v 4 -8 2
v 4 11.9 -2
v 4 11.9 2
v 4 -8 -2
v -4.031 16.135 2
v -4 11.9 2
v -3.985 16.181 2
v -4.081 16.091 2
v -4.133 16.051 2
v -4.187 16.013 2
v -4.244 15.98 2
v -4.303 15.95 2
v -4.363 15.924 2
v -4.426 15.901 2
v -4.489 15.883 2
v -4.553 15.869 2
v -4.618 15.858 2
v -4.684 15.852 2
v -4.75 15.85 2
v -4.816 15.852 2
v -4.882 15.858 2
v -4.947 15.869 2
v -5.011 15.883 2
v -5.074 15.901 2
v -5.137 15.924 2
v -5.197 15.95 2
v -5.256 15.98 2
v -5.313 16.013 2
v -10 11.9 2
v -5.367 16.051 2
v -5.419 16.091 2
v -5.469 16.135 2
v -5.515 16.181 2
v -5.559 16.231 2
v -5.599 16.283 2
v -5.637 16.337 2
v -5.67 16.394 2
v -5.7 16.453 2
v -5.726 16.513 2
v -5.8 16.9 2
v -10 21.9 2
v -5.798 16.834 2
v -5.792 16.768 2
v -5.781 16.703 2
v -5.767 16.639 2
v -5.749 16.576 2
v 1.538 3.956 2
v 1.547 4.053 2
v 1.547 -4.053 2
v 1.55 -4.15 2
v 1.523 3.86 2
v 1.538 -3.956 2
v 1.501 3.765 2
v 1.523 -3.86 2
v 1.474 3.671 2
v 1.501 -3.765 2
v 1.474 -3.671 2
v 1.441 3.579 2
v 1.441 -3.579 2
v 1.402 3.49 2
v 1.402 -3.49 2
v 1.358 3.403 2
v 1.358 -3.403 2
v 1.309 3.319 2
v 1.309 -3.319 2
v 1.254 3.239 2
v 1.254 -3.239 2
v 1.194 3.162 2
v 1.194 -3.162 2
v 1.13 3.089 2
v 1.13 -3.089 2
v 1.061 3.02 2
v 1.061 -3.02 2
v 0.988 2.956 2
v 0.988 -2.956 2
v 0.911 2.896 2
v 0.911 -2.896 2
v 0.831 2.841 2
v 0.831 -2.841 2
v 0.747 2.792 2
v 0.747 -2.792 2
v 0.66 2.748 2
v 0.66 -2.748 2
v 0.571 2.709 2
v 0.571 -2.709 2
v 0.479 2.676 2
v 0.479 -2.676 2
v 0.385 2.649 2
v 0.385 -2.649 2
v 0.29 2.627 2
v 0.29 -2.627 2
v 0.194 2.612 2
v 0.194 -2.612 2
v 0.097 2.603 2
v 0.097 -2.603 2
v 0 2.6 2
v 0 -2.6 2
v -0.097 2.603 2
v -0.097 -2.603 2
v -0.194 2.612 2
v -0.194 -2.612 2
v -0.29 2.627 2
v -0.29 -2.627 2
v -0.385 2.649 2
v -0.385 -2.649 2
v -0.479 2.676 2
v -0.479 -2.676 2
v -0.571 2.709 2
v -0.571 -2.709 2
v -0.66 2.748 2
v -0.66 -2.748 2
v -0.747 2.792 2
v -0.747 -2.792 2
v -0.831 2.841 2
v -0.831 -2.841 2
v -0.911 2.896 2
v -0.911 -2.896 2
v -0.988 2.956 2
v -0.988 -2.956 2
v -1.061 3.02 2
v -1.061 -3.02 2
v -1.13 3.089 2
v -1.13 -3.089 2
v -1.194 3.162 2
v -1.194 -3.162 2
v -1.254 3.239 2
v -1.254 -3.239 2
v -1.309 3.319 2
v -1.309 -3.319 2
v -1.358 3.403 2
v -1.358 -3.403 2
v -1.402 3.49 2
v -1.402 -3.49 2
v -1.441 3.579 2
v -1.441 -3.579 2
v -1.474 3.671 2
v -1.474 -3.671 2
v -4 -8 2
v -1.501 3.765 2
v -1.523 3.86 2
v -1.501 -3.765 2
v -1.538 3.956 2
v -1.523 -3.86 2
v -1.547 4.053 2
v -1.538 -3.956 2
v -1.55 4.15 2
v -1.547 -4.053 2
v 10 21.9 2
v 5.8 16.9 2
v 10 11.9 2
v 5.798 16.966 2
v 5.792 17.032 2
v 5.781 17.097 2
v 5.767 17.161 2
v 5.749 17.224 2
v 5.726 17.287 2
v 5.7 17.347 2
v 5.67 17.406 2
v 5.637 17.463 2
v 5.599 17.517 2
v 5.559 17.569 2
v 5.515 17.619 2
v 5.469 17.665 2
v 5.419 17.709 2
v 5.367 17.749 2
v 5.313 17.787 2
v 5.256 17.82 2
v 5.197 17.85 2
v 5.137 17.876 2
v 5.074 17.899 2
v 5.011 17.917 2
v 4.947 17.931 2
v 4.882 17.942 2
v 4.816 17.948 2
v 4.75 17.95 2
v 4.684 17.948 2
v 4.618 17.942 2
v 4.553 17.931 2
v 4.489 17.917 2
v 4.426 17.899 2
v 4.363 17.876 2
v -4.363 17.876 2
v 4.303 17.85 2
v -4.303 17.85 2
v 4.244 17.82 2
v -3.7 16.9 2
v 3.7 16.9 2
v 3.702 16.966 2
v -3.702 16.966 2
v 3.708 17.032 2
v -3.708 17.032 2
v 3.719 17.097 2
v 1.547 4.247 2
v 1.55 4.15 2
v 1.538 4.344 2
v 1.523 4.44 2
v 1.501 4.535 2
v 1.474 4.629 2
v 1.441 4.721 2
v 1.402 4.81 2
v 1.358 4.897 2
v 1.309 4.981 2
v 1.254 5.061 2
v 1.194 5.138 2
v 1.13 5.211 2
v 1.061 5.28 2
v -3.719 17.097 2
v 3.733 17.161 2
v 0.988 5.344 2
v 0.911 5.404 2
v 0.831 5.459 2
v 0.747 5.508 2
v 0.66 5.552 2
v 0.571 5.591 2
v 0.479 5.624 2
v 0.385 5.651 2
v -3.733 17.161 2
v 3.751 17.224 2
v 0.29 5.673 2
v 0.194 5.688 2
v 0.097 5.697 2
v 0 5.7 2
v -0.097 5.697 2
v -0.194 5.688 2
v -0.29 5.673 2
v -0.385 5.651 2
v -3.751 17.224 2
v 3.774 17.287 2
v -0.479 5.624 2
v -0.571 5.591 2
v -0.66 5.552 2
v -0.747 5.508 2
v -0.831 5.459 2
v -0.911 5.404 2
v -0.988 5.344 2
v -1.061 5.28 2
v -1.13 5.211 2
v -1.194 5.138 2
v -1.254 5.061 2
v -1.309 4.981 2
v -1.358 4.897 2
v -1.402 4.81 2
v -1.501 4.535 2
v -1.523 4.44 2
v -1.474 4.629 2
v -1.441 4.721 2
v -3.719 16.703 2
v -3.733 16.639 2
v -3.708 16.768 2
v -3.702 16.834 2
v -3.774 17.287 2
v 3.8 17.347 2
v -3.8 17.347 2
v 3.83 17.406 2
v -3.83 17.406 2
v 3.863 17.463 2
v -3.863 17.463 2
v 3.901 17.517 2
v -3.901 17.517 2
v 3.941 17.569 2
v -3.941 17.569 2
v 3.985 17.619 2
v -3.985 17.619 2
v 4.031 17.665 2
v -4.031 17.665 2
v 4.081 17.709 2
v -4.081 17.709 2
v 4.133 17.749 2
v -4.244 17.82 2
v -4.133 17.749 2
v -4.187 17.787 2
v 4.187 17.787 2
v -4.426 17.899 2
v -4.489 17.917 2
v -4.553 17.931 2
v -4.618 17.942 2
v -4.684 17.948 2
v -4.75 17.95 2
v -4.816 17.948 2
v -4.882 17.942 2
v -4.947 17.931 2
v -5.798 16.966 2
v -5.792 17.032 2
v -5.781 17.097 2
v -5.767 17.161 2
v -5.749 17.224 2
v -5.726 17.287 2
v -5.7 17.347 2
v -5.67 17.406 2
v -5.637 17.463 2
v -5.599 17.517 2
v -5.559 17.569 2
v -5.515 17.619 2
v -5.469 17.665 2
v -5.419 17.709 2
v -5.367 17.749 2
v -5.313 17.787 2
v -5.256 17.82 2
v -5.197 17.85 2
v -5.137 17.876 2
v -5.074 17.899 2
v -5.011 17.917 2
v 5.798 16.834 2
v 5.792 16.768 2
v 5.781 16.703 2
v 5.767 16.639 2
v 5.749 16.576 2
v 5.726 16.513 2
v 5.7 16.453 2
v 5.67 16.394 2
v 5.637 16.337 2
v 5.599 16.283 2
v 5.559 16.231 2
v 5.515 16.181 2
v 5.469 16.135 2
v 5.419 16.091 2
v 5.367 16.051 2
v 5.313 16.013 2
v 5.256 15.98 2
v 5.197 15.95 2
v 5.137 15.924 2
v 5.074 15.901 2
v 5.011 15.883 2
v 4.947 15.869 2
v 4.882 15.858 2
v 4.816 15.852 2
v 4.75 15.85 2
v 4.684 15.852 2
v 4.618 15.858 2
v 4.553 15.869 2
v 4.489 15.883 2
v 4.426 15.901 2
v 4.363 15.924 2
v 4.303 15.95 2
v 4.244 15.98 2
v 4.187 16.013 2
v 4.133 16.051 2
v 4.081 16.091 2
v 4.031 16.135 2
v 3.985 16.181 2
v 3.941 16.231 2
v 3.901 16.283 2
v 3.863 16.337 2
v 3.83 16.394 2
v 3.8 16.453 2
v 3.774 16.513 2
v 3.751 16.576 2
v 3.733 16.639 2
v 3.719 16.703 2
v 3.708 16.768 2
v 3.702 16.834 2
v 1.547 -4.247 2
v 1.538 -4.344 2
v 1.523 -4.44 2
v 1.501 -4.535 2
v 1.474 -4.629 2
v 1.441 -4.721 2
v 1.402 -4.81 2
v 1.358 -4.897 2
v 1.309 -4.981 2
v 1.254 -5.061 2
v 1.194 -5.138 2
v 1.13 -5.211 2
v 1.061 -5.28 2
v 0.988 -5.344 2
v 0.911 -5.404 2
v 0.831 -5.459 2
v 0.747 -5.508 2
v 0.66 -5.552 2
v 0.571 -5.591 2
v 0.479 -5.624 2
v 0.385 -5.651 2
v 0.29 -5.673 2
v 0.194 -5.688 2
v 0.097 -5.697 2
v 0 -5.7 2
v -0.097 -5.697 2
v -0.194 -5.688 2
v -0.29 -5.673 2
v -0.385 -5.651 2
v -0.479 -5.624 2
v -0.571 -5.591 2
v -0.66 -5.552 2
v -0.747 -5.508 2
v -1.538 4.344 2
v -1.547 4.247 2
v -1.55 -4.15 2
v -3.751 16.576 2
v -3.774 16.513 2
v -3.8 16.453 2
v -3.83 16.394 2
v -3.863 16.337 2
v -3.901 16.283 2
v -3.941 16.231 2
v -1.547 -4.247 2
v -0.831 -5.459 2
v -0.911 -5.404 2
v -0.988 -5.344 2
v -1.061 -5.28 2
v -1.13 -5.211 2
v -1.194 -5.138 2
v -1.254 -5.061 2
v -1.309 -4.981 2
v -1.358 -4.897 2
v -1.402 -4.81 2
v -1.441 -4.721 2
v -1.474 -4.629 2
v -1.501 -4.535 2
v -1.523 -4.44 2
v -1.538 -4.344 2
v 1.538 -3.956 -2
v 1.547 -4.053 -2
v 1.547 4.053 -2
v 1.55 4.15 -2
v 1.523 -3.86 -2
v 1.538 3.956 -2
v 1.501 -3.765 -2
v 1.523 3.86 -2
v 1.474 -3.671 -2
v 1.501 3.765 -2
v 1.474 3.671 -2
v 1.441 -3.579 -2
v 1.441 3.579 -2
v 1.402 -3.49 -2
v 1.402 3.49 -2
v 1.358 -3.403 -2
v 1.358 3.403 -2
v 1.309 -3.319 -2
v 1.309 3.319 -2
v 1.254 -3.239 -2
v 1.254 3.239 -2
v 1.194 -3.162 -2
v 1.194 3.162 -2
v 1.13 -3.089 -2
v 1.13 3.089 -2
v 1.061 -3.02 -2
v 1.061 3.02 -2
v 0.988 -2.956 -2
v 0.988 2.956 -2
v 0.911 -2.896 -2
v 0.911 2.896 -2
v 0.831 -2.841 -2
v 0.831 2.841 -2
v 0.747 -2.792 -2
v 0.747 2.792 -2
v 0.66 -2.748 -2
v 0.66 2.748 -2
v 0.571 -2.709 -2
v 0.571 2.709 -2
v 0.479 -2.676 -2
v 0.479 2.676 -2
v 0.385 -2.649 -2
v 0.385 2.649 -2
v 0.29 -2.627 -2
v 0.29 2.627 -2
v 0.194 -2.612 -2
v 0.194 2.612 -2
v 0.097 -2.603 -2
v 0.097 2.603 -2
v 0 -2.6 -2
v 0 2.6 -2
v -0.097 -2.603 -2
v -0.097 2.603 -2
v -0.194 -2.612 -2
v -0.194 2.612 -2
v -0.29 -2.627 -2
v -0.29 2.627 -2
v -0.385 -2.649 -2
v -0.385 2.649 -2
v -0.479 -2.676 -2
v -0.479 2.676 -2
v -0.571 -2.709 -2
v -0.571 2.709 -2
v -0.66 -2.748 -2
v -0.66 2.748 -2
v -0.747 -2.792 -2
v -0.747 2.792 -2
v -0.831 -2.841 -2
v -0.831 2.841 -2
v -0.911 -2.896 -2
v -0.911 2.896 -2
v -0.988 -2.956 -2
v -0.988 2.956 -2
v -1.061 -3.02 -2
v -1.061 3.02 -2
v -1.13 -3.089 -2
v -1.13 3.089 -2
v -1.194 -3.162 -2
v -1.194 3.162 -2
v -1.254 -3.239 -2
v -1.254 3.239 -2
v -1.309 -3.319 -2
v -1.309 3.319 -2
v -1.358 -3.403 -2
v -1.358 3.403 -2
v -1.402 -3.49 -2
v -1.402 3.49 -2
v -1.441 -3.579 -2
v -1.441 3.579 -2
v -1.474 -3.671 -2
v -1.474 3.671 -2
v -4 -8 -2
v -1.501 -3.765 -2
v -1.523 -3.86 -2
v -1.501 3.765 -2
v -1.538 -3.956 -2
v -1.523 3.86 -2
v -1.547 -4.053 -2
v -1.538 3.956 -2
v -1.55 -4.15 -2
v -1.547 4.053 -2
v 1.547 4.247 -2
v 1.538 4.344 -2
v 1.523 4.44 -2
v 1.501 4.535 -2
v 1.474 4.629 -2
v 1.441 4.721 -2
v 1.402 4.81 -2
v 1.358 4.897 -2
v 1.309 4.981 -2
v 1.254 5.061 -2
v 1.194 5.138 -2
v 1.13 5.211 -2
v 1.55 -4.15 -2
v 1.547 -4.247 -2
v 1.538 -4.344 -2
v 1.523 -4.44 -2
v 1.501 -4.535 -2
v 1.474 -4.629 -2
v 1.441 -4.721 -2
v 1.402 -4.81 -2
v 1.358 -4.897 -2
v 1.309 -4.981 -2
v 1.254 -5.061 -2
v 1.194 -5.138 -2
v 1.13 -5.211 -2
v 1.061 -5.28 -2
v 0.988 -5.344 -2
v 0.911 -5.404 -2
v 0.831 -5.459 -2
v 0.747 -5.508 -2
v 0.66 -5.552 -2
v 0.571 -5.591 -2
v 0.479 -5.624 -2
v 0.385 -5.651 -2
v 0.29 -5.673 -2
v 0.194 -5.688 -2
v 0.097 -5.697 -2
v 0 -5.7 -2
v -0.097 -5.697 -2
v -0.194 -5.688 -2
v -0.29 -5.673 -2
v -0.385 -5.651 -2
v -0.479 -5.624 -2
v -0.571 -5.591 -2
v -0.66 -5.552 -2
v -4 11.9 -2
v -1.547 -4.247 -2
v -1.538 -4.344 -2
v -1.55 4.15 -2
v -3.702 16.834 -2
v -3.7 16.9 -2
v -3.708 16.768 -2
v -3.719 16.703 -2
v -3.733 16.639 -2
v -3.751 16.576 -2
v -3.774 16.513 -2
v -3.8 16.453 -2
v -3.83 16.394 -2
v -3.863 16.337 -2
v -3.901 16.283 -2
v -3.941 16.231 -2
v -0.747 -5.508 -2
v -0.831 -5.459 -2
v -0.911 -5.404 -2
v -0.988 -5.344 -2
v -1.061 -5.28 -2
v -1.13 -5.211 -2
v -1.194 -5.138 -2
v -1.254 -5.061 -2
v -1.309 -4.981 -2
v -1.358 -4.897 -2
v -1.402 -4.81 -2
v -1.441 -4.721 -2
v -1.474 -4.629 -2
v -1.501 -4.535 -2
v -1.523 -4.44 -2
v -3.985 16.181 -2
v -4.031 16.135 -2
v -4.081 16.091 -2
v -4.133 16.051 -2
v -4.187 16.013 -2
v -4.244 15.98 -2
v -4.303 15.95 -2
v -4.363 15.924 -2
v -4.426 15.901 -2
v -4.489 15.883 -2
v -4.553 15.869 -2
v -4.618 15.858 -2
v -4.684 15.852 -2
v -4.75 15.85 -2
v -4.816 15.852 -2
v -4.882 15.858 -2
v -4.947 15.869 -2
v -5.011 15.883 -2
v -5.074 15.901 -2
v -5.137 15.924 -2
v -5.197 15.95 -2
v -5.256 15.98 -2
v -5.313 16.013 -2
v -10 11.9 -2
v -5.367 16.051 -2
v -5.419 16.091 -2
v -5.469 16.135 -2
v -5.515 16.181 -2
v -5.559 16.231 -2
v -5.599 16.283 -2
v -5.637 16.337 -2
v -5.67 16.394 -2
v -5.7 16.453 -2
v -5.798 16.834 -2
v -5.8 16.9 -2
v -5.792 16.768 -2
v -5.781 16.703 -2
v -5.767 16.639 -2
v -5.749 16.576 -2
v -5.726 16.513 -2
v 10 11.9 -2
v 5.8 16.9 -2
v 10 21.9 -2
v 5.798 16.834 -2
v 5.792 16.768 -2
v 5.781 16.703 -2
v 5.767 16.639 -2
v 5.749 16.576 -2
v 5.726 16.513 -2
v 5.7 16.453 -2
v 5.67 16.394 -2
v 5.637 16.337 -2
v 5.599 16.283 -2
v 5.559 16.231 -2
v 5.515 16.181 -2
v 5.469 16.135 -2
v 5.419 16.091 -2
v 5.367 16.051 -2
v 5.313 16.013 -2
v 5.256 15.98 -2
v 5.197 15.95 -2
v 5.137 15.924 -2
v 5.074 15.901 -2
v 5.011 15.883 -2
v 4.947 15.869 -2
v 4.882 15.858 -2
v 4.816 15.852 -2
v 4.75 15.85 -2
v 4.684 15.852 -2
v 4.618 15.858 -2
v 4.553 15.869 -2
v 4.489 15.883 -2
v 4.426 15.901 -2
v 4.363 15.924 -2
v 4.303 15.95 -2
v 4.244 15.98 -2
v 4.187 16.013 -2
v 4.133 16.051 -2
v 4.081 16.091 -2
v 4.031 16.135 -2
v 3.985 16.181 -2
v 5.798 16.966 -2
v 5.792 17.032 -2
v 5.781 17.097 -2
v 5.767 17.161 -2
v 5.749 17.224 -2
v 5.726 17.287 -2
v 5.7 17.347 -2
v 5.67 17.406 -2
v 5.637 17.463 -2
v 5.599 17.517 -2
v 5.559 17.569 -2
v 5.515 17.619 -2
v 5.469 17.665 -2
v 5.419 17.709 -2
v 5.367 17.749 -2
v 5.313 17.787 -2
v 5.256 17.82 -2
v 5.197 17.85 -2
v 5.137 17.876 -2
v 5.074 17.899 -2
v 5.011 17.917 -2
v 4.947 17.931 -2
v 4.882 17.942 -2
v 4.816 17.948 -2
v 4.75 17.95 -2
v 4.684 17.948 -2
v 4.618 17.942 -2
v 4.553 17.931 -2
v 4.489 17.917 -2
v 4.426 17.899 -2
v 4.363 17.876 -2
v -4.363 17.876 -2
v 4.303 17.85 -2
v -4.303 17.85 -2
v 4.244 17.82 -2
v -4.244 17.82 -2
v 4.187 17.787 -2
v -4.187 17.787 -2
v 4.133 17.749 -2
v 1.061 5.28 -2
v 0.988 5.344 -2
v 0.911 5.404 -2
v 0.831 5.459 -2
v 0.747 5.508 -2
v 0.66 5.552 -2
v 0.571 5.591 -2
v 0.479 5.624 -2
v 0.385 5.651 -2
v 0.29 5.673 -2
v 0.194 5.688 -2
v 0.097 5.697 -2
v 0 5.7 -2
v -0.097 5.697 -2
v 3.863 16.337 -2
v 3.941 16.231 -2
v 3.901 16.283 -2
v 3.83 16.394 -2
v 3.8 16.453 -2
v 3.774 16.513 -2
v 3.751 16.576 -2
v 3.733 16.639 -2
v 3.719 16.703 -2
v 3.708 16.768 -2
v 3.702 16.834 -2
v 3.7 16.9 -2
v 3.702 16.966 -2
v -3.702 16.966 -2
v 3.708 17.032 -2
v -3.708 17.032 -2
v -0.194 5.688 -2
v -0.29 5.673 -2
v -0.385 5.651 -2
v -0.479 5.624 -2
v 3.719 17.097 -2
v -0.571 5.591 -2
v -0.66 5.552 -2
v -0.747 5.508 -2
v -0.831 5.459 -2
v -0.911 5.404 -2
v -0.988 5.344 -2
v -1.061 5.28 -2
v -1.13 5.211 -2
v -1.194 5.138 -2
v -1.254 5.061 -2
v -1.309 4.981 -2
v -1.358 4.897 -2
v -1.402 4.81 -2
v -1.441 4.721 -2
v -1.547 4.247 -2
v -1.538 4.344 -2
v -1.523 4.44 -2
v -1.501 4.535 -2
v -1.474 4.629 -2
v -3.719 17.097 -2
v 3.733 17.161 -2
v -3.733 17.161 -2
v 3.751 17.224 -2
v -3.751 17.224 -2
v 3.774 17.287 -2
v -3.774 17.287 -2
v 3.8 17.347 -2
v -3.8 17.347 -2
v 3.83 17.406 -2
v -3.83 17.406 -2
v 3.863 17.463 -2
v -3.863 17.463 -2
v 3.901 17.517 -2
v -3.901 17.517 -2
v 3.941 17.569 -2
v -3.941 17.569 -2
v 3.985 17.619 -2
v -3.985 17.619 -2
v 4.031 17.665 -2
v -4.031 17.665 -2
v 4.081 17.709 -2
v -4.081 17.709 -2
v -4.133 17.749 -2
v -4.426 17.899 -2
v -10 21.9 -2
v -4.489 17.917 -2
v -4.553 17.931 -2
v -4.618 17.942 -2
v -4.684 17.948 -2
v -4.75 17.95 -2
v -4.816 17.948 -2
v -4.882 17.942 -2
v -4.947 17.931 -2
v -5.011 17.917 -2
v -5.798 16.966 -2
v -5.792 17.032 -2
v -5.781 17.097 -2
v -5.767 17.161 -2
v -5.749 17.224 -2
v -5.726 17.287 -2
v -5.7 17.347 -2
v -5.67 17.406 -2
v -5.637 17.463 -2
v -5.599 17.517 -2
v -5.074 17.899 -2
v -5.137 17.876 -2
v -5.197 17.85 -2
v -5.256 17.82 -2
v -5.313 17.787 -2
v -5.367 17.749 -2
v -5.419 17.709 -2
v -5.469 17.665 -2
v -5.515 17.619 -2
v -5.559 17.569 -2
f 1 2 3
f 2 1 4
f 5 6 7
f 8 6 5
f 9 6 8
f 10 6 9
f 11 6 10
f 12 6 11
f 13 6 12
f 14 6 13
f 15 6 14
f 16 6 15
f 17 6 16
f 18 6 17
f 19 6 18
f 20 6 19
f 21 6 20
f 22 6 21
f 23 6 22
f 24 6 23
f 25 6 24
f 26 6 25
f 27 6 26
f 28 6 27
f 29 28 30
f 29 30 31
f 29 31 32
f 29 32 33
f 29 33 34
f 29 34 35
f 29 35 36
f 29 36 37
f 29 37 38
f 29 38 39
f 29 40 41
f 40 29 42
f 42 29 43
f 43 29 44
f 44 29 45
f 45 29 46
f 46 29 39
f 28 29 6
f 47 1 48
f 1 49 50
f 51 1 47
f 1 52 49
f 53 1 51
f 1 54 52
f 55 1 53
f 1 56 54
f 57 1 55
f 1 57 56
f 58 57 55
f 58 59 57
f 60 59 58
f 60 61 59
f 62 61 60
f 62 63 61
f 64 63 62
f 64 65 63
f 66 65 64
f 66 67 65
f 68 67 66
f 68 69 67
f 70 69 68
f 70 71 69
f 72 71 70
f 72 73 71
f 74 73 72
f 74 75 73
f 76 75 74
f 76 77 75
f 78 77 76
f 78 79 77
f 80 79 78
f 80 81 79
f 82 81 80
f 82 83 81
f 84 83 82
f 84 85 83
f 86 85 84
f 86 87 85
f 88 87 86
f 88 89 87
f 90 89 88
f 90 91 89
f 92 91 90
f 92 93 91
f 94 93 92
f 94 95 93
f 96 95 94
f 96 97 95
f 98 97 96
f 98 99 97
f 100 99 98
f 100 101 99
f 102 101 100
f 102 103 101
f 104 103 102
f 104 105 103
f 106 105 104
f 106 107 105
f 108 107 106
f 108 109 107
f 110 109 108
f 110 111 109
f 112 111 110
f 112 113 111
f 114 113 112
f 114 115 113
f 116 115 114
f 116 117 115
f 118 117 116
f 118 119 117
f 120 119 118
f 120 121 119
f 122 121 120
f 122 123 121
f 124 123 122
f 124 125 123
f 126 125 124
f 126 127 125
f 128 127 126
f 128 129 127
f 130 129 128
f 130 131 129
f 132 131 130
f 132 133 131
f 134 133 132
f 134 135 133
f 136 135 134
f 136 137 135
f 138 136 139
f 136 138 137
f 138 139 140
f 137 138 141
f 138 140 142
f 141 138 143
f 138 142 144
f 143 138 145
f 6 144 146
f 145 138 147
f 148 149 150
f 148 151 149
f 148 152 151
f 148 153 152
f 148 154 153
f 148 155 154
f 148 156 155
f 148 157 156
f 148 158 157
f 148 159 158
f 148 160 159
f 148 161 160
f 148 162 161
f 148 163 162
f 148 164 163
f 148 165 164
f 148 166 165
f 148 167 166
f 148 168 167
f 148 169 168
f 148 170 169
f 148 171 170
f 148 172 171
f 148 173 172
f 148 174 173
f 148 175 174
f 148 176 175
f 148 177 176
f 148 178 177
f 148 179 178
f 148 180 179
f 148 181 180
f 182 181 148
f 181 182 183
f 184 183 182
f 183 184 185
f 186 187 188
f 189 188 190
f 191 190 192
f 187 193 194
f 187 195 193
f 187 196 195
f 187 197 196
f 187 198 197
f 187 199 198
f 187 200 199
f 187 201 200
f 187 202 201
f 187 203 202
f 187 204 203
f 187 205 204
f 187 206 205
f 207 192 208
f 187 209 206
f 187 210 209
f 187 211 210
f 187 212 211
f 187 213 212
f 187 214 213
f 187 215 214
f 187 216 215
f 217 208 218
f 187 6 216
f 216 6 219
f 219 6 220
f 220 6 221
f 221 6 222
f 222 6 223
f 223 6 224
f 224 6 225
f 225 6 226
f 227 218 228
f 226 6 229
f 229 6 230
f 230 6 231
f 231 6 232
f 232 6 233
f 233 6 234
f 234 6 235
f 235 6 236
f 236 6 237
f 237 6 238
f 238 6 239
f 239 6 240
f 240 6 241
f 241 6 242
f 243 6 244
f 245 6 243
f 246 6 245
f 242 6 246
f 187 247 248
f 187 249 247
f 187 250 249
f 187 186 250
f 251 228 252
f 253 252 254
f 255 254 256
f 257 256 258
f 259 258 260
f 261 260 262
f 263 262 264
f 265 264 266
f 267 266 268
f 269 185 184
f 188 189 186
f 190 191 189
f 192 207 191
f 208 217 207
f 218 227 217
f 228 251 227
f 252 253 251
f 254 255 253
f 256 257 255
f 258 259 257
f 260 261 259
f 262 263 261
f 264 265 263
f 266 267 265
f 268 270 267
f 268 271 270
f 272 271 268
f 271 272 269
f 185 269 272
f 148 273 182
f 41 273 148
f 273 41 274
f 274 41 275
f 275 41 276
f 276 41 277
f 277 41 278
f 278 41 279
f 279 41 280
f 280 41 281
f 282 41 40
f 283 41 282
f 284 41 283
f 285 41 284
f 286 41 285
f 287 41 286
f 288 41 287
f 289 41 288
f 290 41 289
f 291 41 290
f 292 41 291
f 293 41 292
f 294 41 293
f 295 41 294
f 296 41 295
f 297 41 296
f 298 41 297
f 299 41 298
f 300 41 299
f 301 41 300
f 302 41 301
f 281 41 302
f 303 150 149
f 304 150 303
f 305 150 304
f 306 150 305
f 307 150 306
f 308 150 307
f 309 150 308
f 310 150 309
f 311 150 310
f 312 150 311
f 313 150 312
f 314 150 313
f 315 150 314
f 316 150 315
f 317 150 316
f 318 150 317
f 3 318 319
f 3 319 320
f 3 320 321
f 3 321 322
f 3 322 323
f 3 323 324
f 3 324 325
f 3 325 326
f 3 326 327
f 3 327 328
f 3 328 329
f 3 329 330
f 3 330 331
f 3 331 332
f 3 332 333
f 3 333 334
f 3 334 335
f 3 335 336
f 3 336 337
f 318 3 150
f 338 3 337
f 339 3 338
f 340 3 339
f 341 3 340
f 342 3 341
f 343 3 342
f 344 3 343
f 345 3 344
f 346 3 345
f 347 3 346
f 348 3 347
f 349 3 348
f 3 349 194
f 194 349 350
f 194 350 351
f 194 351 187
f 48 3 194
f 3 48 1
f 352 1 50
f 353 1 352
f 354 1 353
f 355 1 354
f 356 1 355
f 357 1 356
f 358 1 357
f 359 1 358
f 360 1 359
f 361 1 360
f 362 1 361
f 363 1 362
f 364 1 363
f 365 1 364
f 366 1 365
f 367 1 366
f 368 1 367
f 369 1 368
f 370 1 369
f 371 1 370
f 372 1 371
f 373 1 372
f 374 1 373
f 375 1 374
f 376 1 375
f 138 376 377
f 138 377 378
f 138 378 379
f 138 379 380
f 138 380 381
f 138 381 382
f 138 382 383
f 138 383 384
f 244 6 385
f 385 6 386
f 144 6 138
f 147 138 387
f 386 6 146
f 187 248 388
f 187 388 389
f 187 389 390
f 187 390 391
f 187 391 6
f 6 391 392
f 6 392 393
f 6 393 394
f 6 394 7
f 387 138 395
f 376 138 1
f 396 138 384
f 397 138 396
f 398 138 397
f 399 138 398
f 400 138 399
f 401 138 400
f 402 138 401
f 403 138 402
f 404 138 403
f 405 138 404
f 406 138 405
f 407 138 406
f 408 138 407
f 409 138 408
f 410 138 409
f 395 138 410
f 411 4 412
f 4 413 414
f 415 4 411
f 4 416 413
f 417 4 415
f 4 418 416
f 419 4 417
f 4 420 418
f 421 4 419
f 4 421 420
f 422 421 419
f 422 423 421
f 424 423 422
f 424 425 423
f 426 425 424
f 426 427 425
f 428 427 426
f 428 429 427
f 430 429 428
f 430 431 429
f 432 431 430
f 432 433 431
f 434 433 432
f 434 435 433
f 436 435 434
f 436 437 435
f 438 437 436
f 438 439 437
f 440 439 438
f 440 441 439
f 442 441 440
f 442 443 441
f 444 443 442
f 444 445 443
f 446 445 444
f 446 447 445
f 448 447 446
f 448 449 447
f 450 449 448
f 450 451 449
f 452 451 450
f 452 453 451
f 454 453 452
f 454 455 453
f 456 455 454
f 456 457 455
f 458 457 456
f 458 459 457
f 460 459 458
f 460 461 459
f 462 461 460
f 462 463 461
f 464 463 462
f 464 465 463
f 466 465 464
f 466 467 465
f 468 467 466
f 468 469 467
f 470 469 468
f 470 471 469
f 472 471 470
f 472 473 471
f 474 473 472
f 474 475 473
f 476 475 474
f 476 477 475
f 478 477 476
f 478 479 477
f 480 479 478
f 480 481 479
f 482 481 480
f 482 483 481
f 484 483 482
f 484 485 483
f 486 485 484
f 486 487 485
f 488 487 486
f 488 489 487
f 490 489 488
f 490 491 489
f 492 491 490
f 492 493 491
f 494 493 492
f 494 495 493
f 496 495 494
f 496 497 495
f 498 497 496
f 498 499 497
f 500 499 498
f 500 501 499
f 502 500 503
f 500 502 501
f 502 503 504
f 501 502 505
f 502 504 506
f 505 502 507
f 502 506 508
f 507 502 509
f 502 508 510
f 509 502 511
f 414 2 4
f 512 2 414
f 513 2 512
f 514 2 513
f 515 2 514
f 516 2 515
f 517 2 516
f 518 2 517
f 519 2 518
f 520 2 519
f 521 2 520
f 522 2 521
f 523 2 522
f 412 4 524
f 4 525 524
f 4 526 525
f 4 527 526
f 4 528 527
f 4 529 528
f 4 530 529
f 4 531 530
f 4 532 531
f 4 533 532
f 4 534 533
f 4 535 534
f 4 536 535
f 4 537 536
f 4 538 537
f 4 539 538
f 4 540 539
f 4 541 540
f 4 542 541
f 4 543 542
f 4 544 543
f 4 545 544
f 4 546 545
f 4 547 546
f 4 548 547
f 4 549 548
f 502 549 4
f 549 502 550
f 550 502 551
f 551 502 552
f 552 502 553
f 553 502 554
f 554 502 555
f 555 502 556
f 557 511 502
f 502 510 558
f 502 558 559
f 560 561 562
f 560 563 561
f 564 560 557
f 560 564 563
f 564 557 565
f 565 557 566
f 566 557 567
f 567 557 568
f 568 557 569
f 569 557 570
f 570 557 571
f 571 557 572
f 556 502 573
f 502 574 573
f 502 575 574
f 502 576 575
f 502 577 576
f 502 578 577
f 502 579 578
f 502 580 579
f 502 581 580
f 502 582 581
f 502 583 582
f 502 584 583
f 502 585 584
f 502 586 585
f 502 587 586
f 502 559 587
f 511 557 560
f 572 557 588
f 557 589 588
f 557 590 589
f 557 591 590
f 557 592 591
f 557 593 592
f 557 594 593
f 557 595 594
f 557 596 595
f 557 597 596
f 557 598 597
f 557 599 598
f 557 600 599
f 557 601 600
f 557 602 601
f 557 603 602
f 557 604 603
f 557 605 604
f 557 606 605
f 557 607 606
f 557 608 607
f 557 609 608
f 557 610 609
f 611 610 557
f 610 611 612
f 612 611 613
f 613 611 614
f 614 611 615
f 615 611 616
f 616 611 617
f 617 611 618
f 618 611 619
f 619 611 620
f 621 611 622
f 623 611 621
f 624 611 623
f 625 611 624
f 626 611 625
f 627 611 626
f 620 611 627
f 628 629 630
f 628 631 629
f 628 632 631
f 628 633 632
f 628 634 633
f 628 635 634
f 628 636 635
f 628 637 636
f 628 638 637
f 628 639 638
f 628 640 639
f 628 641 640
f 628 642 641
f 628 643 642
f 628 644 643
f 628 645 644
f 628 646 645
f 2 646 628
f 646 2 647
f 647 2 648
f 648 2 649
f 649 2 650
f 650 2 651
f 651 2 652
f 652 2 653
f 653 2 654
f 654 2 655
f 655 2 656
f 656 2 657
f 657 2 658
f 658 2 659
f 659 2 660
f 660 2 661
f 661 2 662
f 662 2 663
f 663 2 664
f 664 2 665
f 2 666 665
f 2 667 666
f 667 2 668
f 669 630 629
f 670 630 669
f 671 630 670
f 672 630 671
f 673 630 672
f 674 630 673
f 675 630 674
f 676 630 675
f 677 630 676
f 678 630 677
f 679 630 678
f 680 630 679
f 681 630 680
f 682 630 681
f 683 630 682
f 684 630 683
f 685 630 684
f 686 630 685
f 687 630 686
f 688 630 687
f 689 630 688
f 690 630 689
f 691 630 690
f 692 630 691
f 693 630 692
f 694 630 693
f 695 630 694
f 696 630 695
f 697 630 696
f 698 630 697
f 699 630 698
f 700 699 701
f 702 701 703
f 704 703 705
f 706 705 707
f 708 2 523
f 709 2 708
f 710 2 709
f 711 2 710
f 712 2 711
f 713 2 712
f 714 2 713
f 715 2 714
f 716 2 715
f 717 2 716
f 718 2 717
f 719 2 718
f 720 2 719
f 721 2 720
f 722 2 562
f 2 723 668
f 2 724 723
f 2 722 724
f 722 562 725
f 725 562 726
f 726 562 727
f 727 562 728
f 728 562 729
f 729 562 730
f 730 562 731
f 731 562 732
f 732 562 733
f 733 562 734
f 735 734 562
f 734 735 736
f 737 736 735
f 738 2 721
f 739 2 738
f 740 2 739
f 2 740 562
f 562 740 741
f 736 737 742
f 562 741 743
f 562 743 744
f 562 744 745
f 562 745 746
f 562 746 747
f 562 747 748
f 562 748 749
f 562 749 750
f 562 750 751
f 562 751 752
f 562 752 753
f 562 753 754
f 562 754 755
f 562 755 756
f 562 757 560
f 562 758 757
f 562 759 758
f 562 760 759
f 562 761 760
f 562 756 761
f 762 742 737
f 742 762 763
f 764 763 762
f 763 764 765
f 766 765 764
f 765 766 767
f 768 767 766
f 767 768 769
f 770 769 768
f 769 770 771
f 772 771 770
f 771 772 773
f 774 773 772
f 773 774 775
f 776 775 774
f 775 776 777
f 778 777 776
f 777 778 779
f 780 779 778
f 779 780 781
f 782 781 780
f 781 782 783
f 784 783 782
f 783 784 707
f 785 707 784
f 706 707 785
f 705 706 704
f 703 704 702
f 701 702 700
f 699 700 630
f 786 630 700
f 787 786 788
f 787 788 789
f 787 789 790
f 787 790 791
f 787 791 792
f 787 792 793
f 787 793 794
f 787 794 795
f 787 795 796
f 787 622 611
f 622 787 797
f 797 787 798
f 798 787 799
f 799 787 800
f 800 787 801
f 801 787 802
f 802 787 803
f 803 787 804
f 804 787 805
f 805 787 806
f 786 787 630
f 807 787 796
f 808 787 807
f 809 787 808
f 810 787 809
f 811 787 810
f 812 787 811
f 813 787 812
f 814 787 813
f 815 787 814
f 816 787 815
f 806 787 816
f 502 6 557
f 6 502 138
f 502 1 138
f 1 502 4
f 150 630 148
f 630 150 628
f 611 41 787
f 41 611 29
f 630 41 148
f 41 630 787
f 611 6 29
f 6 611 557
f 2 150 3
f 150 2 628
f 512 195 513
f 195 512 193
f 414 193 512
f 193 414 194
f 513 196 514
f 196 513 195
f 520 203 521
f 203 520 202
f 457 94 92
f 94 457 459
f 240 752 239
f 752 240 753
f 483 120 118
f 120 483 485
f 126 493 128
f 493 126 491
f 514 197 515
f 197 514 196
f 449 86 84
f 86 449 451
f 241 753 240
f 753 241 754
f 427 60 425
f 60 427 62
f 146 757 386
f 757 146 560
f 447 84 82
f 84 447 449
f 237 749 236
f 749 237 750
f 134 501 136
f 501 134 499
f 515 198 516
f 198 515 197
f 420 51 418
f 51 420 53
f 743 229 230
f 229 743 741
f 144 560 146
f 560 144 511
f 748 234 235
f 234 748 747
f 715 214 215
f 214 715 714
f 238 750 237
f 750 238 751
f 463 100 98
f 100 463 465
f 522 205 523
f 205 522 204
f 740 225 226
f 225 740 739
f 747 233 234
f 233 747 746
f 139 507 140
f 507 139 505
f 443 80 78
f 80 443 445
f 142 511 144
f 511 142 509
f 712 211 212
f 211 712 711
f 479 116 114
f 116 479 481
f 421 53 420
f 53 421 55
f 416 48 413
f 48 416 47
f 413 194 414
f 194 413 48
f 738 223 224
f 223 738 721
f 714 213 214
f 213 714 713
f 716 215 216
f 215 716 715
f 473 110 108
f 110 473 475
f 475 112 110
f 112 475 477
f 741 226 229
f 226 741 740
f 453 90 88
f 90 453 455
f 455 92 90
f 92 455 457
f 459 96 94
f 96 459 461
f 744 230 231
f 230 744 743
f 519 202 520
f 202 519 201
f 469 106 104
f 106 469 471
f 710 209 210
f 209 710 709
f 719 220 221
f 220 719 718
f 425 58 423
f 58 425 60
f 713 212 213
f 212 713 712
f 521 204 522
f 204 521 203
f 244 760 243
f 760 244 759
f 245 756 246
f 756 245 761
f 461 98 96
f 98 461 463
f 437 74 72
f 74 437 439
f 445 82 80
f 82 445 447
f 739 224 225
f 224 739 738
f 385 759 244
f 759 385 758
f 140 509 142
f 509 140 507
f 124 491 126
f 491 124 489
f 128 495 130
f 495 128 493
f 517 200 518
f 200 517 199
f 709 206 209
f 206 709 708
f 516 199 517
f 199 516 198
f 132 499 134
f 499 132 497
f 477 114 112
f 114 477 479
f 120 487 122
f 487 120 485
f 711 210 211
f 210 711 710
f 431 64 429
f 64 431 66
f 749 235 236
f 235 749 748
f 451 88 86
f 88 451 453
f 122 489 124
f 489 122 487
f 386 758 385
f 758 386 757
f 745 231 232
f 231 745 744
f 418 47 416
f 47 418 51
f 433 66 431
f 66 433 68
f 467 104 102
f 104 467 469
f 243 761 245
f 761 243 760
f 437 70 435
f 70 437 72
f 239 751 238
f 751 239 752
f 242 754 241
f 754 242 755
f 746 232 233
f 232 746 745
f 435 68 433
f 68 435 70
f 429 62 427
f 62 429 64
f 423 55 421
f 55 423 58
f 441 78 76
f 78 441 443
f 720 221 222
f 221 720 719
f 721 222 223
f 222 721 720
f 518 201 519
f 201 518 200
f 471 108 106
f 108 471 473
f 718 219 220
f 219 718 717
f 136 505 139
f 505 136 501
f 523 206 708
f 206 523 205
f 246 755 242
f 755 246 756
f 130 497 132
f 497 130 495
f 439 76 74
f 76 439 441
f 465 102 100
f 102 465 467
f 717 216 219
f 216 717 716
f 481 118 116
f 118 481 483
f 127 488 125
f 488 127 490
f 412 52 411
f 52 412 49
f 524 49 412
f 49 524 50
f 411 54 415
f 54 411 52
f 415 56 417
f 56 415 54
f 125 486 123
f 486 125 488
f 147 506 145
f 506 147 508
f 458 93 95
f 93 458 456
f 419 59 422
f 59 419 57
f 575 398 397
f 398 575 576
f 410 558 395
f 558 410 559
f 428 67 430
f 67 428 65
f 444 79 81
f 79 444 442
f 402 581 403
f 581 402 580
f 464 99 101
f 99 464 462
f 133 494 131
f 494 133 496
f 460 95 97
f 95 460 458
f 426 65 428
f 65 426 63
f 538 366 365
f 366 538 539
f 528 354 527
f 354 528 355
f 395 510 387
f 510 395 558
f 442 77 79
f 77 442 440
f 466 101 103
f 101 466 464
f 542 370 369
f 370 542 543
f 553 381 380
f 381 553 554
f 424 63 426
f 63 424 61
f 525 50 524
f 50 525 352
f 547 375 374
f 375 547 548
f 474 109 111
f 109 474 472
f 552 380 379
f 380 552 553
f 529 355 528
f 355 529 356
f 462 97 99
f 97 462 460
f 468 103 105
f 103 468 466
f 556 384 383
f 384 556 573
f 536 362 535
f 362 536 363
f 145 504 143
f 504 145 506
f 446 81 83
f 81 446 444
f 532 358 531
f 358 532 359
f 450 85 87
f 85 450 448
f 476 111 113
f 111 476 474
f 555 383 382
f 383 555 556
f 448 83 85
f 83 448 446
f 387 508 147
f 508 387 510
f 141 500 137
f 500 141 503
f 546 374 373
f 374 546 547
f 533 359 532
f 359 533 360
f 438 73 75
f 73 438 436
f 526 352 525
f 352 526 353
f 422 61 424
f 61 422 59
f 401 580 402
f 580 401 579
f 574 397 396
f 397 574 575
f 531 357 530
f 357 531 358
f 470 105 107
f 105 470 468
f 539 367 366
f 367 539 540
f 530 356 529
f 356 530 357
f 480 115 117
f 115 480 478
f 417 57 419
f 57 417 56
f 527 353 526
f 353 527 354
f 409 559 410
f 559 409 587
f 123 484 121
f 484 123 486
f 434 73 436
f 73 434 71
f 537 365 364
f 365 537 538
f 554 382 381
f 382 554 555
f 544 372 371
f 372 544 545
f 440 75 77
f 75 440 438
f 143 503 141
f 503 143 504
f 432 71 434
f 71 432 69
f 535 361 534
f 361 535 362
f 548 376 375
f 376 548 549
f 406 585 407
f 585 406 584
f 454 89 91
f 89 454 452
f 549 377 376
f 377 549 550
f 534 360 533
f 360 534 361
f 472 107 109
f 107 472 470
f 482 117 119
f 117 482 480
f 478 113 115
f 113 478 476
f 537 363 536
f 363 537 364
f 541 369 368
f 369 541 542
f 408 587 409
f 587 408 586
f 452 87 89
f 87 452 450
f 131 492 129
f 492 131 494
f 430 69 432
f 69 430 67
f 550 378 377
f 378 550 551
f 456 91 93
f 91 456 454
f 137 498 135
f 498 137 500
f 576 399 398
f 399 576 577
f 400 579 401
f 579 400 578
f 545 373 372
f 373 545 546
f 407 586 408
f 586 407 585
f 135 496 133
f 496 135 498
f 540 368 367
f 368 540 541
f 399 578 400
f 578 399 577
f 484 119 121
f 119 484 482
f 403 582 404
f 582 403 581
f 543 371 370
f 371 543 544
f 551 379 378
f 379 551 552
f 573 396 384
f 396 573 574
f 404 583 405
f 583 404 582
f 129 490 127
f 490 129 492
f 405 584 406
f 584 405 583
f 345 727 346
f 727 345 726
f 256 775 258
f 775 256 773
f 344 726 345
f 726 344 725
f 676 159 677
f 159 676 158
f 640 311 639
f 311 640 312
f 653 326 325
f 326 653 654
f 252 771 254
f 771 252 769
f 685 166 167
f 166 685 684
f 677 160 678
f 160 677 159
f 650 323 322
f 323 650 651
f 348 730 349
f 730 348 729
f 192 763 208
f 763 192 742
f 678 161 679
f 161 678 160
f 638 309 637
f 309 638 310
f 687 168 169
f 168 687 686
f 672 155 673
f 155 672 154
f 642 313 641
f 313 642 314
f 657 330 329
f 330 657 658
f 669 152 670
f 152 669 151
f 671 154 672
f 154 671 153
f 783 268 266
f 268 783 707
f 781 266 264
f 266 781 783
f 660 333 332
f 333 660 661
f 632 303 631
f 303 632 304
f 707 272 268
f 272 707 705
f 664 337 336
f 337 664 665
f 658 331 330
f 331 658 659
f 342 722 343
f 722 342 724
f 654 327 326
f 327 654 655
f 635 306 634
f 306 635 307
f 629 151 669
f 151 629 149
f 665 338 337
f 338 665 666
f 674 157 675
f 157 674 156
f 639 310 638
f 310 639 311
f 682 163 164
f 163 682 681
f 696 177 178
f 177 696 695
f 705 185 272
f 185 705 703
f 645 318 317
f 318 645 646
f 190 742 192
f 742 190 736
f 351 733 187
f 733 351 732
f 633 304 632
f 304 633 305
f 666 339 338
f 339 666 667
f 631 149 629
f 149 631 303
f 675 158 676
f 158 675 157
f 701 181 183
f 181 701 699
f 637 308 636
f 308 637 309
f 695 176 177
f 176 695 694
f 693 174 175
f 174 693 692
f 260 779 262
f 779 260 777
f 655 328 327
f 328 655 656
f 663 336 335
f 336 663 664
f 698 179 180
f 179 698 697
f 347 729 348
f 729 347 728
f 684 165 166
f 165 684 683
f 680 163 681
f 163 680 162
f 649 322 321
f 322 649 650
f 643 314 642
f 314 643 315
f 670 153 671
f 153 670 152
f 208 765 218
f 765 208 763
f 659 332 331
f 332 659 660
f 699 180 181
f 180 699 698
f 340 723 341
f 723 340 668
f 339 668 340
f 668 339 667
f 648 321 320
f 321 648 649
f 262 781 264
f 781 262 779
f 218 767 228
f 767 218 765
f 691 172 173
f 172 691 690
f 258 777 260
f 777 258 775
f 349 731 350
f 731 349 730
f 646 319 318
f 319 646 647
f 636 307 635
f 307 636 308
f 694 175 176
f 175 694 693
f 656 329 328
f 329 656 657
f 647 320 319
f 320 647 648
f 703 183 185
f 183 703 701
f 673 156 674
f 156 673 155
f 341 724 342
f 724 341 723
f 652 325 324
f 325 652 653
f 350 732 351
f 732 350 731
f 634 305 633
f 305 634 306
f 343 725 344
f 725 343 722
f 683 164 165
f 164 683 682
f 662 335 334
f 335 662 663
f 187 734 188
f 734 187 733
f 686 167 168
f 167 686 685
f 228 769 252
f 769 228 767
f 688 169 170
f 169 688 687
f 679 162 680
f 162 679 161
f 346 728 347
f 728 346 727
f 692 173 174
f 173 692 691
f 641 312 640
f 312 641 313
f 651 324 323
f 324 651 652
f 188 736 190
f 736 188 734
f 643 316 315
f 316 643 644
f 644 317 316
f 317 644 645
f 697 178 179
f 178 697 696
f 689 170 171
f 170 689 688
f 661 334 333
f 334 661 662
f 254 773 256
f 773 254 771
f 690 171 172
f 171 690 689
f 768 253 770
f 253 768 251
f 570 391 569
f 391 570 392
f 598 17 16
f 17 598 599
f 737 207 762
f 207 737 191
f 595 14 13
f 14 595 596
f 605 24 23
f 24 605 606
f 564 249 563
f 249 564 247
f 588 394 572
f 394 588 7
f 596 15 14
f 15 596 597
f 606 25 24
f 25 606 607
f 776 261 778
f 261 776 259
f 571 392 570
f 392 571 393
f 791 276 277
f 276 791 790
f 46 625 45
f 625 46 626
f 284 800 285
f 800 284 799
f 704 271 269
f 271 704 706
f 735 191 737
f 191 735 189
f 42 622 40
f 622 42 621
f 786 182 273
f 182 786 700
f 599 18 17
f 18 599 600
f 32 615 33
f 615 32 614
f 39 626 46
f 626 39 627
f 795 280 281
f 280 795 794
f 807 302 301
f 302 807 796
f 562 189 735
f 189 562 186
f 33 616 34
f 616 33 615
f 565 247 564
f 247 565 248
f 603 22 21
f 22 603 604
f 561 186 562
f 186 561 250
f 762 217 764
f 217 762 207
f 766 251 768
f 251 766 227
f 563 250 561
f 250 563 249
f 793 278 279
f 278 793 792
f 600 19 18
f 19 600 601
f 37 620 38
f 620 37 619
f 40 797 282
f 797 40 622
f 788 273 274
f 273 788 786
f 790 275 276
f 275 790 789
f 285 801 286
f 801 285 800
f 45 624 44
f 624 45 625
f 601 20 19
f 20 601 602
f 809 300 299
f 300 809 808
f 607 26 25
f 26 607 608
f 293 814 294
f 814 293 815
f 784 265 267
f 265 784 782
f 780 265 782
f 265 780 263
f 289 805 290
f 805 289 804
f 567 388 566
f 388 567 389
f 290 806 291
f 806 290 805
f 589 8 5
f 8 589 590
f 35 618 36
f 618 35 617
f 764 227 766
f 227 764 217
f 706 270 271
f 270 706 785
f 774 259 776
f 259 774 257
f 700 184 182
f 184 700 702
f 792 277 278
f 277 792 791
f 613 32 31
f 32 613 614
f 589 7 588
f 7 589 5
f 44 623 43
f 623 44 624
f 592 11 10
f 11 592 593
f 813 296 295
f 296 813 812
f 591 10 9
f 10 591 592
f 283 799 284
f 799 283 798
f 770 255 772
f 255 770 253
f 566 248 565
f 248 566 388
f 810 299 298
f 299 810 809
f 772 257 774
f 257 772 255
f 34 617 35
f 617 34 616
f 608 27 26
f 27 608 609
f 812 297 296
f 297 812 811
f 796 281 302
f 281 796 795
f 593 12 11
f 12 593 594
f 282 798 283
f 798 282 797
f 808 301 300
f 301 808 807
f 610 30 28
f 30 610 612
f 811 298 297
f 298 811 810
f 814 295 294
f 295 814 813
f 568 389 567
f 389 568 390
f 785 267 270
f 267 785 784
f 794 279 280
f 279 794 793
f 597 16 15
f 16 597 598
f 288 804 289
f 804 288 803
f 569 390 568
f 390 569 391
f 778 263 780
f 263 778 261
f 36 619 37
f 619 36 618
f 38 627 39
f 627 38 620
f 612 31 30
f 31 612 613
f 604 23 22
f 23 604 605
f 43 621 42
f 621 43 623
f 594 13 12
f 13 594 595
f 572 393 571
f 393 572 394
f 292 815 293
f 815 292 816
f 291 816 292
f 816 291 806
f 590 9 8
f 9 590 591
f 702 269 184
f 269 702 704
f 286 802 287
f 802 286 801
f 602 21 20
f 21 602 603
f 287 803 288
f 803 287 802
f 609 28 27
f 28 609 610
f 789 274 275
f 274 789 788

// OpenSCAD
// file: ucon_config.scad
tubeOD = 0.92*25.4+0.25;	//0.92", thin-wall 3/4" conduit +0.4 clearance
tubeID = 20.828;	// 0.82", thin-wall 3/4" conduit
wallthick = 7;		// wall thickness for the tube
clearOD = 0.5;		// tube clearance
screwOD = 4.7;		// clearance for M4 or SAE size 8 screw
screwthick = 3;		// wall thickness for the screw
totalheight = 25;
clearance = 0.5;
tolerance = 0.1;
oringthick = 2.5;
oringOD = 28.702;	// oring size 119 (use 118 for build)
overlap = 0.05;
clearlen = 5;

ctcdist = 50;
// main file
/*
*   CAD file for some endstop mounts. The "T" shaped endstop holder mounts to the top of the
*  carriage. The other mounts clip onto 8mm linear rods. 
*
*  Creative Commons Share Alike 3.0
*  Copyright (c) 2013 David Lee Miller
* 
*/
include <ucon_config.scad>
use <ucon_functions.scad>
use <MCAD/motors.scad>
use <MCAD/nuts_and_bolts.scad>
$fn=100;

// endstop mounting parameters
mounting_sep = 15.3-7;
switch_sep = 9.5;


// set type to 1 if carriage endstop mount, 2 if 8mm rod mount
type = 1;

if(type == 1) carriage_endstop();
else rotate([0,90,0]) outer_endstop();

module outer_endstop(){
 difference(){
  translate([0,0,2]) cube([8,14,18],center=true); // main block
  translate([0,0,-7]) cube([9,6,14],center=true); // make an opening for the 8mm rod
  translate([0,0,1.5]) rotate([0,90,0]) cylinder(r=4,h=15,center=true); // circular opening
  translate([0,switch_sep/2,13]) cylinder(r=2/2-0.05,h=20,center=true);  // screw hole mounts
  translate([0,-switch_sep/2,13]) cylinder(r=2/2-0.05,h=20,center=true);
  translate([0,0,-4.25]) rotate([90,0,0]) cylinder(r=3/2+0.05,h=20,center=true); // clip tension screw
}}

module carriage_endstop(){
 difference(){
  union(){ // T shaped block
   translate([0,2,0]) cube([8,20,4],center=true);
   translate([0,8+9-0.1,0]) cube([20,10,4],center=true);}
  // M3 screw mounts for carriage
  translate([0,mounting_sep/2,0]) cylinder(r=3/2+0.05,h=10,center=true);
  translate([0,-mounting_sep/2,0]) cylinder(r=3/2+0.05,h=10,center=true);
  // M2 screw mounts for endstop
  translate([switch_sep/2,8+9-0.1,0]) cylinder(r=2/2+0.05,h=10,center=true);
  translate([-switch_sep/2,8+9-0.1,0]) cylinder(r=2/2+0.05,h=10,center=true);
}}
